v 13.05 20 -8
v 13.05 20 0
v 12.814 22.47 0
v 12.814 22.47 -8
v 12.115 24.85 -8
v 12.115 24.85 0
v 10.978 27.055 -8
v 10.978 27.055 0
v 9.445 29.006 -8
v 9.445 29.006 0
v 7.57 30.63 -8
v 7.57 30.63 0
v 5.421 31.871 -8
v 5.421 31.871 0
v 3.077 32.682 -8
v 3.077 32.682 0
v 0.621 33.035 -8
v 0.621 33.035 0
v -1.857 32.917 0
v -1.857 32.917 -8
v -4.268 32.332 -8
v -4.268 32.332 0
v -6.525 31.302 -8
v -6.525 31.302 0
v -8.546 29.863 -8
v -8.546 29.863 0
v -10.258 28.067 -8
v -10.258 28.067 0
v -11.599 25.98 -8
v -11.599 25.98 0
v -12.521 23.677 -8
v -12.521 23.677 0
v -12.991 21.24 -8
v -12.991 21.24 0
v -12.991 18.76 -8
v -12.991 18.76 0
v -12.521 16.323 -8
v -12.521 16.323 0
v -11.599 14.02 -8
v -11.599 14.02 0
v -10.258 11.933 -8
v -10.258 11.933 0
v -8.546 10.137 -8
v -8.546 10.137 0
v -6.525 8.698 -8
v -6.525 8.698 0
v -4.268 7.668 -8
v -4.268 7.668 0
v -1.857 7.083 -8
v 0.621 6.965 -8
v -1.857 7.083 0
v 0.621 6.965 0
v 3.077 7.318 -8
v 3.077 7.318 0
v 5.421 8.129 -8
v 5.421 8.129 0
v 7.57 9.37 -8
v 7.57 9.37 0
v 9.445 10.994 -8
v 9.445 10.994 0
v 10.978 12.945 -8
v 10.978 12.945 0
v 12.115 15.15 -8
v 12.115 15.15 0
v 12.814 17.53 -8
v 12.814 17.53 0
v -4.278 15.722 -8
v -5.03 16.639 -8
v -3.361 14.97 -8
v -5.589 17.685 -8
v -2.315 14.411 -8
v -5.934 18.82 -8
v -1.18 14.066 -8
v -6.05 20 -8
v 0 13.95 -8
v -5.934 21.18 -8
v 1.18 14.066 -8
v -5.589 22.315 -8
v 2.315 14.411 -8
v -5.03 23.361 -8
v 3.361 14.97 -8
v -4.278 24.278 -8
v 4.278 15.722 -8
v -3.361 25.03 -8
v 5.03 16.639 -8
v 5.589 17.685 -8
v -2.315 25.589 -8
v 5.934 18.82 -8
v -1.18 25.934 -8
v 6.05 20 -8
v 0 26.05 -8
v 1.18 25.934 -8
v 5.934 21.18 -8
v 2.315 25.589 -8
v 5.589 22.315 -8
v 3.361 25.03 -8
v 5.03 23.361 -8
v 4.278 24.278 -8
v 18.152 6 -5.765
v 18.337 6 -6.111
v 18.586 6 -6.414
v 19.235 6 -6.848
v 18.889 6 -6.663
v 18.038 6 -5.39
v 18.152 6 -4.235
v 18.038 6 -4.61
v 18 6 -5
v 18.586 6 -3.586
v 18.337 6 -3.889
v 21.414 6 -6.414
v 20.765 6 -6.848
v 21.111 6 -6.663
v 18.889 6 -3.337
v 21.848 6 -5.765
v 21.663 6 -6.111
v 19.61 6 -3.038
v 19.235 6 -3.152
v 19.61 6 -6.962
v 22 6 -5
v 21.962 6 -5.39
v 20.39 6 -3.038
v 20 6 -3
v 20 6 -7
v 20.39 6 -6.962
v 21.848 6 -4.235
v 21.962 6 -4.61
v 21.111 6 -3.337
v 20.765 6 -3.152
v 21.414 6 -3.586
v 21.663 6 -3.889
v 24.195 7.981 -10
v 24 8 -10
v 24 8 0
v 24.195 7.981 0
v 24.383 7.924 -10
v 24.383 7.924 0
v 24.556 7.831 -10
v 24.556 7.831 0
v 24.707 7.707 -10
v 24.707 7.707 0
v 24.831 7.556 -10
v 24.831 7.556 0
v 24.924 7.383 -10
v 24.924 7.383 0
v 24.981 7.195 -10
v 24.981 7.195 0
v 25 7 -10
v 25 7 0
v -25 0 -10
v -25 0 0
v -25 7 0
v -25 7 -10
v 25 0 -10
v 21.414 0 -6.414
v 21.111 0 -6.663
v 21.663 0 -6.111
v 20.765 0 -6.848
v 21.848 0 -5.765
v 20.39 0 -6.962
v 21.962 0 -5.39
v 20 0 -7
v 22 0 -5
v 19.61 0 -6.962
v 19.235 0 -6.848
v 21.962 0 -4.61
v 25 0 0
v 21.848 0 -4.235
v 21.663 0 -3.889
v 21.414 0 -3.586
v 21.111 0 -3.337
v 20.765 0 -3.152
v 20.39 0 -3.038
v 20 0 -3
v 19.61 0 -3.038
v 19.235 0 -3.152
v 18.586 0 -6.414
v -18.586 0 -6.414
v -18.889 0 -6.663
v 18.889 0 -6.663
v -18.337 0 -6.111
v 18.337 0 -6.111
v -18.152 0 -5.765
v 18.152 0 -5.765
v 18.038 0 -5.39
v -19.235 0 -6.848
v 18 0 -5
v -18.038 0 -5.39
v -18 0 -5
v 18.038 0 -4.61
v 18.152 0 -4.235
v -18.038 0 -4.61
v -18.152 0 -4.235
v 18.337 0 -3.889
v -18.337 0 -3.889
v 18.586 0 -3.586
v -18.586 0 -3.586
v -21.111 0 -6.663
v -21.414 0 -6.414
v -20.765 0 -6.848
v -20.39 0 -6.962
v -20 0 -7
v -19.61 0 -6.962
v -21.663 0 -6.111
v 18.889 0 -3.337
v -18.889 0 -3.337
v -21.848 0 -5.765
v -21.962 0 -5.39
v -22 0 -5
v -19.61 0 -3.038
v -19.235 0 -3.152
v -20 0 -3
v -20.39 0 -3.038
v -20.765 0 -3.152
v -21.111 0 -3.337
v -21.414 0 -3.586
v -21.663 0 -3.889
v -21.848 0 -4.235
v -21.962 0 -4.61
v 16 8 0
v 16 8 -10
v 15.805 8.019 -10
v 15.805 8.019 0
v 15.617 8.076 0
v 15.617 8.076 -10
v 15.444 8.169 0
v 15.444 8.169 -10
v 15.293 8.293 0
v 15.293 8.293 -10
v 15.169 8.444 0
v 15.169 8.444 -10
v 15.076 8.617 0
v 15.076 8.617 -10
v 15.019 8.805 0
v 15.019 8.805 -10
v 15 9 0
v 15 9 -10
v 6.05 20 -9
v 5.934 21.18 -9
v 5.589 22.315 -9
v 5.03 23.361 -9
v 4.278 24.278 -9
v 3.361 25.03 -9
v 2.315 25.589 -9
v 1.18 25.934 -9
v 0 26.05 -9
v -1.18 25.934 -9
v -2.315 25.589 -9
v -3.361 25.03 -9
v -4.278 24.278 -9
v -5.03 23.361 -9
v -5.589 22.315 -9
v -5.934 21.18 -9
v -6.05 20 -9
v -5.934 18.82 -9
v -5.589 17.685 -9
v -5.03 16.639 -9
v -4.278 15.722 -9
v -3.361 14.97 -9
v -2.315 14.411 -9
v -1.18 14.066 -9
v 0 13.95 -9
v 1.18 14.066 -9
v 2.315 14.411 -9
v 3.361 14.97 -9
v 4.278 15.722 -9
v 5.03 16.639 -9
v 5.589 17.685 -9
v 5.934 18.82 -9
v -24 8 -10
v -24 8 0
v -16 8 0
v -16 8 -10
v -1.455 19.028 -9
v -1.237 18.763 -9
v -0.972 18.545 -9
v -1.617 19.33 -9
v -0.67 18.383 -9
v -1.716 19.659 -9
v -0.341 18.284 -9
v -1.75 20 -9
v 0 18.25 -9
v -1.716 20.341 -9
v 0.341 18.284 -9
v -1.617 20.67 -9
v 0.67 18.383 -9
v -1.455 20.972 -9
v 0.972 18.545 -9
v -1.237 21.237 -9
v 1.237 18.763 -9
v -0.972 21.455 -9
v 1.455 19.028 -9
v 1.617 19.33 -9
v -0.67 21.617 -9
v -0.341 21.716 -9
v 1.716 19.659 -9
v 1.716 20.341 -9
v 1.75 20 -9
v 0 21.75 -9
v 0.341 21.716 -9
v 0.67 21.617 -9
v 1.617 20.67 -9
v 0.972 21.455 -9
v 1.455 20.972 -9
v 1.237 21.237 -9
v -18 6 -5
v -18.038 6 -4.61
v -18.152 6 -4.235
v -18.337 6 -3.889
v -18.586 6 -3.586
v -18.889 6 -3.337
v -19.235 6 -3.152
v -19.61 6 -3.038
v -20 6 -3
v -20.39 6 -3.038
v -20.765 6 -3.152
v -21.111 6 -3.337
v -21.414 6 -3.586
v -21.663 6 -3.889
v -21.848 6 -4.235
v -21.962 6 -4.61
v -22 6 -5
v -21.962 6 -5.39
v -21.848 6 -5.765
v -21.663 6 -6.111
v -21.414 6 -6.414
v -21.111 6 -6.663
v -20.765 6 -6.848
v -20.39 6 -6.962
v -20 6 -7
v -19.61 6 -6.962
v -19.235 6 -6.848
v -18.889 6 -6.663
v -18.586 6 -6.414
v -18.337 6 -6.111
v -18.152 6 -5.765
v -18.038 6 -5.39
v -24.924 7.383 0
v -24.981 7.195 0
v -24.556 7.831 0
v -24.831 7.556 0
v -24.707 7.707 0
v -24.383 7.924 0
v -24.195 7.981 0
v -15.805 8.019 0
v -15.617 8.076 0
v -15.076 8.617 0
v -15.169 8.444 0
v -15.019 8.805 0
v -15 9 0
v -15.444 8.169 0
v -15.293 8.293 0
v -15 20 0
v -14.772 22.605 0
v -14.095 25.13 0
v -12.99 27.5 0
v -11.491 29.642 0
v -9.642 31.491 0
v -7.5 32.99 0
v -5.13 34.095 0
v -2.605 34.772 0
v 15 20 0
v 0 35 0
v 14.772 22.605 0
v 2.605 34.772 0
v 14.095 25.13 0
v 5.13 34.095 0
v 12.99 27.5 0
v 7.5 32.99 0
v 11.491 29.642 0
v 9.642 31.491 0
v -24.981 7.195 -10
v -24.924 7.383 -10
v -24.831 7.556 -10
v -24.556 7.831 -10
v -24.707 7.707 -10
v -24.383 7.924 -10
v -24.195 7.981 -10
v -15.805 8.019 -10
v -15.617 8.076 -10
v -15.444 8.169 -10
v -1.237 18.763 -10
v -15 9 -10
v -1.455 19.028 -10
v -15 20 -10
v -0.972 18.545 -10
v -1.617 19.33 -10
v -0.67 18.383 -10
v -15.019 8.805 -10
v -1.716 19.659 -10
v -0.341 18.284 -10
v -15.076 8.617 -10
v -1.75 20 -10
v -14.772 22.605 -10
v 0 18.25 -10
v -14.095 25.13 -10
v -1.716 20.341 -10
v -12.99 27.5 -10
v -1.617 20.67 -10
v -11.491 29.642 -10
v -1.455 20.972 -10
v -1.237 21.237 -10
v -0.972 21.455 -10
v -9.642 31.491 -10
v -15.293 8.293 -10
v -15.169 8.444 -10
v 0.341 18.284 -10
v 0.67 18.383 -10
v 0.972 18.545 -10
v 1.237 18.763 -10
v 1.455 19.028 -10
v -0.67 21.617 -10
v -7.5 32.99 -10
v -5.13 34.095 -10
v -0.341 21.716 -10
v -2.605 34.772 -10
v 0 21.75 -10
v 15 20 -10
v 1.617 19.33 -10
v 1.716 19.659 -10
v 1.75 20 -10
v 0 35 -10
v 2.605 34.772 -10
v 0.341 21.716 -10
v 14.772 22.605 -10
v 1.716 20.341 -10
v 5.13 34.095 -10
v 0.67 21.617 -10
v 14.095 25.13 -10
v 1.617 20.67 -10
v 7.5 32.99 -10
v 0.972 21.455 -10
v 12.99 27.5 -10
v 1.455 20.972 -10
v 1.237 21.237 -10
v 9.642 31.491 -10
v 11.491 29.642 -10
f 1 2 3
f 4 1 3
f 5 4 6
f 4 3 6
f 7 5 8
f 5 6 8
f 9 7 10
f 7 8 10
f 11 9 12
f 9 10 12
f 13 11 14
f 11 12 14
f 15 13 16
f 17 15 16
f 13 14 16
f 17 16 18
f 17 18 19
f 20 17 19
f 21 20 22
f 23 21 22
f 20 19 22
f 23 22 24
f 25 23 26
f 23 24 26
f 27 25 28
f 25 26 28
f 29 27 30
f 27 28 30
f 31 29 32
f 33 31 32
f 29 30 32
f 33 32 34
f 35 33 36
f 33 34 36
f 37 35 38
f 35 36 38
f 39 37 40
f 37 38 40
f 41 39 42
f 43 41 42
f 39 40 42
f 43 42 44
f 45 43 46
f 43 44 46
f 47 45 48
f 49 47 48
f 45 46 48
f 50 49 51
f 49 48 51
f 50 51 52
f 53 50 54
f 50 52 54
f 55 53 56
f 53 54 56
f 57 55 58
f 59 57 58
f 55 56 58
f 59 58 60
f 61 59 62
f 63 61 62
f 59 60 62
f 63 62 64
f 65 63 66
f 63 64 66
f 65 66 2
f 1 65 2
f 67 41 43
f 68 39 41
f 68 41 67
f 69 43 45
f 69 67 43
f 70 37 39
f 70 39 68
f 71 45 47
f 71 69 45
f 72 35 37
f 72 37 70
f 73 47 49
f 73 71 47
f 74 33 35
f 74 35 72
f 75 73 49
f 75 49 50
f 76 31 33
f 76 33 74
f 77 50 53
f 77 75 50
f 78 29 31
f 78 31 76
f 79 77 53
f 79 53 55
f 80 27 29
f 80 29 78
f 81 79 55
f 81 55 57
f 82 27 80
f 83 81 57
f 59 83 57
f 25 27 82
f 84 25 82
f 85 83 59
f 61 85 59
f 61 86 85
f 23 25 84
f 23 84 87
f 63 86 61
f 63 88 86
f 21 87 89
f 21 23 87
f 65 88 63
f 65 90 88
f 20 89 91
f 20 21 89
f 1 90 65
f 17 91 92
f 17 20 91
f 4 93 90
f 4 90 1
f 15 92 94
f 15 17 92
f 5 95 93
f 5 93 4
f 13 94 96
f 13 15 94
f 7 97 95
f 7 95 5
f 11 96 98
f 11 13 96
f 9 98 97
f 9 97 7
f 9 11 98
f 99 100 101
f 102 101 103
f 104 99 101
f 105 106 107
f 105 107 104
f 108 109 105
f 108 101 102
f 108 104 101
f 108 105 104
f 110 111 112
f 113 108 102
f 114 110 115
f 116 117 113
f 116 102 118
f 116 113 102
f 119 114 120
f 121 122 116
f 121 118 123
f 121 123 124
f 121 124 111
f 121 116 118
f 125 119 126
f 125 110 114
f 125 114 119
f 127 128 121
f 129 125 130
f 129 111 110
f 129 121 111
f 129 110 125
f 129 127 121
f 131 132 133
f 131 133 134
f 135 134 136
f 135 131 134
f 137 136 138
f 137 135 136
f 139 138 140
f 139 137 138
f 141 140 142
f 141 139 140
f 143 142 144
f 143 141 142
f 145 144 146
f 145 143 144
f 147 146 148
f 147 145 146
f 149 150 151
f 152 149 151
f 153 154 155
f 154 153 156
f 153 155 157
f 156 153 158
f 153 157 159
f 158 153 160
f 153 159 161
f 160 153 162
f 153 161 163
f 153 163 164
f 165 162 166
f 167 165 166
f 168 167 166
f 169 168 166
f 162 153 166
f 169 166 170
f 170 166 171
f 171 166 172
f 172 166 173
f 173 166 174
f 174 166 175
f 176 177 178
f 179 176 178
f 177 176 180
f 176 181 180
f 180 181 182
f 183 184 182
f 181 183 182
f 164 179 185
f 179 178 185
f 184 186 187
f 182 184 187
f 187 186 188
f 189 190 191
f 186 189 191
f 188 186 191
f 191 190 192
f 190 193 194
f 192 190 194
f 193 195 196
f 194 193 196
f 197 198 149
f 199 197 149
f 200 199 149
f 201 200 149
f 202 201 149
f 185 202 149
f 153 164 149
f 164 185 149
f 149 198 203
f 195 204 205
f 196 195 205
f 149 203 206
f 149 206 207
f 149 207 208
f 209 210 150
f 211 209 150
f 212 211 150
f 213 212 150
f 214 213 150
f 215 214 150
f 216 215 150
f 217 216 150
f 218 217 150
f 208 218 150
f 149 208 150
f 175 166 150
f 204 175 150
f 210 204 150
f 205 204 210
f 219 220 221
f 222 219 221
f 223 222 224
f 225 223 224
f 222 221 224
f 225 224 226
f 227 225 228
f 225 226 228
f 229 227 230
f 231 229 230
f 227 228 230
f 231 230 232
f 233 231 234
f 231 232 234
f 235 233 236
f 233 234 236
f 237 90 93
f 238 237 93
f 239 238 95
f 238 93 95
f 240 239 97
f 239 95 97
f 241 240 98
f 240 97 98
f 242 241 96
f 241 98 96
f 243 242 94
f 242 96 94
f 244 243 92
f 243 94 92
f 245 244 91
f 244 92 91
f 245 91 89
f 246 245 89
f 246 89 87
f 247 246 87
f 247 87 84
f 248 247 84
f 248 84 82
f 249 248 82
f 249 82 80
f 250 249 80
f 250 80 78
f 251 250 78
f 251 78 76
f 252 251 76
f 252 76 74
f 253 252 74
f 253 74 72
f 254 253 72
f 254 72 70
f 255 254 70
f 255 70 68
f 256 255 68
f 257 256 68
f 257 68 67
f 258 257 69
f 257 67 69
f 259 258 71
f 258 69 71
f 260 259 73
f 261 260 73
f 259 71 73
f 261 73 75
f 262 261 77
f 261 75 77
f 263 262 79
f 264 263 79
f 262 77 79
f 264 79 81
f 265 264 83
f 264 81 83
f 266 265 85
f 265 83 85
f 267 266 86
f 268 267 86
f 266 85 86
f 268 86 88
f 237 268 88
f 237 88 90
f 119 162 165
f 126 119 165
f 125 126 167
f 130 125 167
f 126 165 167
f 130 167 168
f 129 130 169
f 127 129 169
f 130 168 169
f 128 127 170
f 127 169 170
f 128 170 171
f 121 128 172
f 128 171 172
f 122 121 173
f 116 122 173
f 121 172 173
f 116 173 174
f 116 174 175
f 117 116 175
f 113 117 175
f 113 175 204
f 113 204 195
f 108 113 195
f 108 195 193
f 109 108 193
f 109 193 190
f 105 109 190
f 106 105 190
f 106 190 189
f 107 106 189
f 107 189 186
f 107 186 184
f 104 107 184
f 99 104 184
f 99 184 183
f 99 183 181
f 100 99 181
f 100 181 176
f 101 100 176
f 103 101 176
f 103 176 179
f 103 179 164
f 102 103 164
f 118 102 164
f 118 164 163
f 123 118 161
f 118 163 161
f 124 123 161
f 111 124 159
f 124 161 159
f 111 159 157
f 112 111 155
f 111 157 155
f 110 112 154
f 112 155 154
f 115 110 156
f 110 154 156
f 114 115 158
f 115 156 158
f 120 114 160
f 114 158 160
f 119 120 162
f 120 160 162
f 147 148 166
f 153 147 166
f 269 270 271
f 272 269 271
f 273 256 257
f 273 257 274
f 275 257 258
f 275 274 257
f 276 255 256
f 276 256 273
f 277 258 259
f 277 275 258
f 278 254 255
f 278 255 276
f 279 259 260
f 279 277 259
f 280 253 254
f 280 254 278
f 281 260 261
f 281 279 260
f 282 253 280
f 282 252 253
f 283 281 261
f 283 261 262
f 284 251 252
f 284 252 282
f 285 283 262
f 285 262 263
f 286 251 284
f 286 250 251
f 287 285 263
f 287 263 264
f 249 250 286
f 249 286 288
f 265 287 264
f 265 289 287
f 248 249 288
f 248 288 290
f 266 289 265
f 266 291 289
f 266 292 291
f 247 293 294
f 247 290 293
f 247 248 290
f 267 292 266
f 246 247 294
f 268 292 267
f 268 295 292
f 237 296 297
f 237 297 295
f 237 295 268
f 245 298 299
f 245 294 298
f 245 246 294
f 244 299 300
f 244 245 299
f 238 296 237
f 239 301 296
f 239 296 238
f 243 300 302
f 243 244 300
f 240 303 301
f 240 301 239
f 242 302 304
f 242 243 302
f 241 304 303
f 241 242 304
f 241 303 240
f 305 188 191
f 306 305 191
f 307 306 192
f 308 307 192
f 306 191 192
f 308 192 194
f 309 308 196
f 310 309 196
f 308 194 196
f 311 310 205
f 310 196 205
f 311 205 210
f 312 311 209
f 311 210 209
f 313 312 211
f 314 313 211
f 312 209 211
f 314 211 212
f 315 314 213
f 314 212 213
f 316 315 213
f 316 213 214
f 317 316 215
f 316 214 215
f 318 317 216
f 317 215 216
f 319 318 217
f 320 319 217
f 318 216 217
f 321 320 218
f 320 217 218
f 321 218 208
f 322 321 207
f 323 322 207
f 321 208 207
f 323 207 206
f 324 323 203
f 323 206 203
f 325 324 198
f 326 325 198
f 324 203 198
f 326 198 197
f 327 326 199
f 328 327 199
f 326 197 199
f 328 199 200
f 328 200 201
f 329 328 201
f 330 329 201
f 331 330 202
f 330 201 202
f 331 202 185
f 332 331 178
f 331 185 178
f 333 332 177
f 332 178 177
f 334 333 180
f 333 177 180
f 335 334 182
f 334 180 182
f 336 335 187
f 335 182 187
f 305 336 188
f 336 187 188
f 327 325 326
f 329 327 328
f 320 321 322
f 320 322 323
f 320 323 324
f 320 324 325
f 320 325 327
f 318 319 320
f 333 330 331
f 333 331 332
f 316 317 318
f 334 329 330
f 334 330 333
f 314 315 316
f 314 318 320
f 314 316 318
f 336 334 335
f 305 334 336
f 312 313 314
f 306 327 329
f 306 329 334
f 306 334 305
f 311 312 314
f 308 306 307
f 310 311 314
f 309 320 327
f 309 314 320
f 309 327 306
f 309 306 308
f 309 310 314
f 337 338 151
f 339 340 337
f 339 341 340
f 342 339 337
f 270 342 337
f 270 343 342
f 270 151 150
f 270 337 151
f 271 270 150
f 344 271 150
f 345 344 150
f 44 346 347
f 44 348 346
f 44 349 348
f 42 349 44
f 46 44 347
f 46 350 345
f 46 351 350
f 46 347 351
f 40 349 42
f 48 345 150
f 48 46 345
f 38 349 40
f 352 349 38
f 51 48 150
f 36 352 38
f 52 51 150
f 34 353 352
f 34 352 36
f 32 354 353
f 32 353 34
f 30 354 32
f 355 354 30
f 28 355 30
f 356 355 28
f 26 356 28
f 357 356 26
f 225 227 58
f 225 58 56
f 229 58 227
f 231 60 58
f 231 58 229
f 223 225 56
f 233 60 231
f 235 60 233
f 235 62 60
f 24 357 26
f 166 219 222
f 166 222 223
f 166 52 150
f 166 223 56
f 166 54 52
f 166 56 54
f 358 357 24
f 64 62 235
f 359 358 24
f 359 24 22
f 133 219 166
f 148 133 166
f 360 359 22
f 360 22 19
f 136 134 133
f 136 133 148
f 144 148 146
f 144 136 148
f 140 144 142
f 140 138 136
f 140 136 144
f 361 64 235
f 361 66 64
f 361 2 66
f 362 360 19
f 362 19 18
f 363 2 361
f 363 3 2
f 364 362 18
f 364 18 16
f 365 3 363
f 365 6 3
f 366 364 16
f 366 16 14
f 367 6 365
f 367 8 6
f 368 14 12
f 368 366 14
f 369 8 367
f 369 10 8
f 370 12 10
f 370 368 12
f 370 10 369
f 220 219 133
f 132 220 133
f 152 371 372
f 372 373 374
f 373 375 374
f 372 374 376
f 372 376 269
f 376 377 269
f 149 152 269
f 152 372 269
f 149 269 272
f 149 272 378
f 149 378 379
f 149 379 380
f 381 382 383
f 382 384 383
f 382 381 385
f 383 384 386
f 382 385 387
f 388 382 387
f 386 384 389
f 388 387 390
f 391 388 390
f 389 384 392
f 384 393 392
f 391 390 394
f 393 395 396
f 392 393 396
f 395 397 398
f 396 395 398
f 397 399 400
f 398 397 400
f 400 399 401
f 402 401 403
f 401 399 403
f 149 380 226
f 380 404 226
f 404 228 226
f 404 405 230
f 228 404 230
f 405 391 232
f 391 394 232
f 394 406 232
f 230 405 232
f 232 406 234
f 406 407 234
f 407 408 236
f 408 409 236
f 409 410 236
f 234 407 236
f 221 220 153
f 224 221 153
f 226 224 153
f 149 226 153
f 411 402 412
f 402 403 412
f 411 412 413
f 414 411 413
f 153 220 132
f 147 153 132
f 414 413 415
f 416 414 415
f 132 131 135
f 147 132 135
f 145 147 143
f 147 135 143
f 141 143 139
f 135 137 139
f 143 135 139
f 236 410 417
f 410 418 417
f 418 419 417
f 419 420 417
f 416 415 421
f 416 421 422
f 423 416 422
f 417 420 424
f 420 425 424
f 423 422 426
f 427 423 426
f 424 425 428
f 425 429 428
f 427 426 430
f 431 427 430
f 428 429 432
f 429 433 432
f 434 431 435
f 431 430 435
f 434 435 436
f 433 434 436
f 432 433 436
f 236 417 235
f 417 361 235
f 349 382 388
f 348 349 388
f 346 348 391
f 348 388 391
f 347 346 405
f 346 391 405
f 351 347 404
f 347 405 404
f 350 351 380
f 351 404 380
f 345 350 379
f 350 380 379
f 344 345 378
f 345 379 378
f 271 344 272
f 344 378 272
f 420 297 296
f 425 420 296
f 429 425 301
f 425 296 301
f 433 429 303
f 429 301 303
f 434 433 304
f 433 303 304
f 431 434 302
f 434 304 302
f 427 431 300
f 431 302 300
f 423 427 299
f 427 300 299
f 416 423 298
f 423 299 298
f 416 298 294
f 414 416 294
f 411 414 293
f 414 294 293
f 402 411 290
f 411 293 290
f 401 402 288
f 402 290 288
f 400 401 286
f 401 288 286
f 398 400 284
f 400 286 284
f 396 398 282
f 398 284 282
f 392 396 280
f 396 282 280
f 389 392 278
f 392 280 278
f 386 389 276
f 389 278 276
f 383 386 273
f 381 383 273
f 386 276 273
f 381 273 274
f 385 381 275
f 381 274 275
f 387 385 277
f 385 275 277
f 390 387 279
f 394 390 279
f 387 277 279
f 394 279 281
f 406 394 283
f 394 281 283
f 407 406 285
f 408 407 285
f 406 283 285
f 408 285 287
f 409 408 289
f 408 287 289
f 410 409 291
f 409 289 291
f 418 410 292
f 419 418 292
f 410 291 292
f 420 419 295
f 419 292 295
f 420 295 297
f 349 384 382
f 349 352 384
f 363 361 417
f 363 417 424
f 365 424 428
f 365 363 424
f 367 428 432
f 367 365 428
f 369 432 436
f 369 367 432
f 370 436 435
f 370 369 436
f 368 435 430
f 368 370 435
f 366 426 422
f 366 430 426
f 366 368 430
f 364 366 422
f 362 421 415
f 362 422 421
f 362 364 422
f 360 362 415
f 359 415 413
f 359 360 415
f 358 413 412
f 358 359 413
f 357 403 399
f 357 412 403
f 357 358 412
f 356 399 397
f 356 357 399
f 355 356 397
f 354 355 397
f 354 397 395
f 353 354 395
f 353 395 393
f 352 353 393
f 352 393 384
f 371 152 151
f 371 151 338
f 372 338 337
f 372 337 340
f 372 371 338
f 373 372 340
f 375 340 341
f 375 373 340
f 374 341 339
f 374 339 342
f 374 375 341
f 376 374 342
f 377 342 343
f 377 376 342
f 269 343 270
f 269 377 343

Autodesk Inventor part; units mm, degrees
ref_plane "YZ Plane" through (0, 0, 0) normal (1, 0, 0) x (0, 1, 0)
ref_plane "XZ Plane" through (0, 0, 0) normal (0, 1, 0) x (-1, 0, 0)
ref_plane "XY Plane" through (0, 0, 0) normal (0, 0, 1) x (1, 0, 0)
sketch "Sketch2" plane through (0, 0, 0) normal (0, 0, 1) x (1, 0, 0)
  line L0 (25, 8) -> (25, 0)
  line L1 (25, 0) -> (-25, 0)
  line L2 (-25, 0) -> (-25, 8)
  line L3 (0, -7) -> (0, 42) projected
  arc A0 (15, 20) -> (-15, 20) centre (0, 20) ccw
  line L4 (0, 42) -> (0, -7) projected
  line L5 (-15, 20) -> (-15, 8)
  line L6 (15, 20) -> (15, 8)
  line L7 (-35, 0) -> (35, 0) projected
  line L8 (-25, 8) -> (-15, 8)
  line L9 (15, 8) -> (25, 8)
  point P0 (0, 0)
  dimension "d4" = 50
  dimension "d6" = 20
  dimension "d7" = 30
  dimension "d8" = 8
  dimension "d9" = 8
extrude "Extrusion2" add sketch "Sketch2" against normal blind 10
sketch "Sketch3" plane through (0, 0, 0) normal (0, 0, 1) x (1, 0, 0)
  arc A0 (15, 20) -> (-15, 20) centre (0, 20) ccw projected
  circle A1 centre (0, 20) radius 13.05
  point P0 (0, 0)
  dimension "d12" = 26.1
extrude "Extrusion3" cut sketch "Sketch3" against normal blind 8
sketch "Sketch4" plane through (0, 20, -8) normal (0, 0, 1) x (1, 0, 0)
  circle A0 centre (0, 0) radius 6.05
  point P0 (0, -20)
  dimension "d15" = 12.1
extrude "Extrusion4" cut sketch "Sketch4" against normal blind 1
sketch "Sketch5" plane through (0, 20, -9) normal (0, 0, 1) x (1, 0, 0)
  circle A0 centre (0, 0) radius 1.75
  point P0 (0, -20)
  dimension "d18" = 3.5
extrude "Extrusion5" cut sketch "Sketch5" against normal blind 1
sketch "Sketch6" plane through (-25, 0, 0) normal (0, -1, 0) x (1, 0, 0)
  circle A0 centre (5, -5) radius 2
  circle A1 centre (45, -5) radius 2
  line L0 (25, -12) -> (25, 2) projected
  line L1 (50, -10) -> (0, -10) projected
  point P0 (25, 0)
  dimension "d21" = 4
  dimension "d22" = 40
  dimension "d23" = 5
extrude "Extrusion6" cut sketch "Sketch6" against normal blind 6
fillet "Fillet1" radius 1 4 edges at (-15, 8, -5) (-25, 8, -5) (15, 8, -5) (25, 8, -5)
properties part number "sg_motor_mount"
